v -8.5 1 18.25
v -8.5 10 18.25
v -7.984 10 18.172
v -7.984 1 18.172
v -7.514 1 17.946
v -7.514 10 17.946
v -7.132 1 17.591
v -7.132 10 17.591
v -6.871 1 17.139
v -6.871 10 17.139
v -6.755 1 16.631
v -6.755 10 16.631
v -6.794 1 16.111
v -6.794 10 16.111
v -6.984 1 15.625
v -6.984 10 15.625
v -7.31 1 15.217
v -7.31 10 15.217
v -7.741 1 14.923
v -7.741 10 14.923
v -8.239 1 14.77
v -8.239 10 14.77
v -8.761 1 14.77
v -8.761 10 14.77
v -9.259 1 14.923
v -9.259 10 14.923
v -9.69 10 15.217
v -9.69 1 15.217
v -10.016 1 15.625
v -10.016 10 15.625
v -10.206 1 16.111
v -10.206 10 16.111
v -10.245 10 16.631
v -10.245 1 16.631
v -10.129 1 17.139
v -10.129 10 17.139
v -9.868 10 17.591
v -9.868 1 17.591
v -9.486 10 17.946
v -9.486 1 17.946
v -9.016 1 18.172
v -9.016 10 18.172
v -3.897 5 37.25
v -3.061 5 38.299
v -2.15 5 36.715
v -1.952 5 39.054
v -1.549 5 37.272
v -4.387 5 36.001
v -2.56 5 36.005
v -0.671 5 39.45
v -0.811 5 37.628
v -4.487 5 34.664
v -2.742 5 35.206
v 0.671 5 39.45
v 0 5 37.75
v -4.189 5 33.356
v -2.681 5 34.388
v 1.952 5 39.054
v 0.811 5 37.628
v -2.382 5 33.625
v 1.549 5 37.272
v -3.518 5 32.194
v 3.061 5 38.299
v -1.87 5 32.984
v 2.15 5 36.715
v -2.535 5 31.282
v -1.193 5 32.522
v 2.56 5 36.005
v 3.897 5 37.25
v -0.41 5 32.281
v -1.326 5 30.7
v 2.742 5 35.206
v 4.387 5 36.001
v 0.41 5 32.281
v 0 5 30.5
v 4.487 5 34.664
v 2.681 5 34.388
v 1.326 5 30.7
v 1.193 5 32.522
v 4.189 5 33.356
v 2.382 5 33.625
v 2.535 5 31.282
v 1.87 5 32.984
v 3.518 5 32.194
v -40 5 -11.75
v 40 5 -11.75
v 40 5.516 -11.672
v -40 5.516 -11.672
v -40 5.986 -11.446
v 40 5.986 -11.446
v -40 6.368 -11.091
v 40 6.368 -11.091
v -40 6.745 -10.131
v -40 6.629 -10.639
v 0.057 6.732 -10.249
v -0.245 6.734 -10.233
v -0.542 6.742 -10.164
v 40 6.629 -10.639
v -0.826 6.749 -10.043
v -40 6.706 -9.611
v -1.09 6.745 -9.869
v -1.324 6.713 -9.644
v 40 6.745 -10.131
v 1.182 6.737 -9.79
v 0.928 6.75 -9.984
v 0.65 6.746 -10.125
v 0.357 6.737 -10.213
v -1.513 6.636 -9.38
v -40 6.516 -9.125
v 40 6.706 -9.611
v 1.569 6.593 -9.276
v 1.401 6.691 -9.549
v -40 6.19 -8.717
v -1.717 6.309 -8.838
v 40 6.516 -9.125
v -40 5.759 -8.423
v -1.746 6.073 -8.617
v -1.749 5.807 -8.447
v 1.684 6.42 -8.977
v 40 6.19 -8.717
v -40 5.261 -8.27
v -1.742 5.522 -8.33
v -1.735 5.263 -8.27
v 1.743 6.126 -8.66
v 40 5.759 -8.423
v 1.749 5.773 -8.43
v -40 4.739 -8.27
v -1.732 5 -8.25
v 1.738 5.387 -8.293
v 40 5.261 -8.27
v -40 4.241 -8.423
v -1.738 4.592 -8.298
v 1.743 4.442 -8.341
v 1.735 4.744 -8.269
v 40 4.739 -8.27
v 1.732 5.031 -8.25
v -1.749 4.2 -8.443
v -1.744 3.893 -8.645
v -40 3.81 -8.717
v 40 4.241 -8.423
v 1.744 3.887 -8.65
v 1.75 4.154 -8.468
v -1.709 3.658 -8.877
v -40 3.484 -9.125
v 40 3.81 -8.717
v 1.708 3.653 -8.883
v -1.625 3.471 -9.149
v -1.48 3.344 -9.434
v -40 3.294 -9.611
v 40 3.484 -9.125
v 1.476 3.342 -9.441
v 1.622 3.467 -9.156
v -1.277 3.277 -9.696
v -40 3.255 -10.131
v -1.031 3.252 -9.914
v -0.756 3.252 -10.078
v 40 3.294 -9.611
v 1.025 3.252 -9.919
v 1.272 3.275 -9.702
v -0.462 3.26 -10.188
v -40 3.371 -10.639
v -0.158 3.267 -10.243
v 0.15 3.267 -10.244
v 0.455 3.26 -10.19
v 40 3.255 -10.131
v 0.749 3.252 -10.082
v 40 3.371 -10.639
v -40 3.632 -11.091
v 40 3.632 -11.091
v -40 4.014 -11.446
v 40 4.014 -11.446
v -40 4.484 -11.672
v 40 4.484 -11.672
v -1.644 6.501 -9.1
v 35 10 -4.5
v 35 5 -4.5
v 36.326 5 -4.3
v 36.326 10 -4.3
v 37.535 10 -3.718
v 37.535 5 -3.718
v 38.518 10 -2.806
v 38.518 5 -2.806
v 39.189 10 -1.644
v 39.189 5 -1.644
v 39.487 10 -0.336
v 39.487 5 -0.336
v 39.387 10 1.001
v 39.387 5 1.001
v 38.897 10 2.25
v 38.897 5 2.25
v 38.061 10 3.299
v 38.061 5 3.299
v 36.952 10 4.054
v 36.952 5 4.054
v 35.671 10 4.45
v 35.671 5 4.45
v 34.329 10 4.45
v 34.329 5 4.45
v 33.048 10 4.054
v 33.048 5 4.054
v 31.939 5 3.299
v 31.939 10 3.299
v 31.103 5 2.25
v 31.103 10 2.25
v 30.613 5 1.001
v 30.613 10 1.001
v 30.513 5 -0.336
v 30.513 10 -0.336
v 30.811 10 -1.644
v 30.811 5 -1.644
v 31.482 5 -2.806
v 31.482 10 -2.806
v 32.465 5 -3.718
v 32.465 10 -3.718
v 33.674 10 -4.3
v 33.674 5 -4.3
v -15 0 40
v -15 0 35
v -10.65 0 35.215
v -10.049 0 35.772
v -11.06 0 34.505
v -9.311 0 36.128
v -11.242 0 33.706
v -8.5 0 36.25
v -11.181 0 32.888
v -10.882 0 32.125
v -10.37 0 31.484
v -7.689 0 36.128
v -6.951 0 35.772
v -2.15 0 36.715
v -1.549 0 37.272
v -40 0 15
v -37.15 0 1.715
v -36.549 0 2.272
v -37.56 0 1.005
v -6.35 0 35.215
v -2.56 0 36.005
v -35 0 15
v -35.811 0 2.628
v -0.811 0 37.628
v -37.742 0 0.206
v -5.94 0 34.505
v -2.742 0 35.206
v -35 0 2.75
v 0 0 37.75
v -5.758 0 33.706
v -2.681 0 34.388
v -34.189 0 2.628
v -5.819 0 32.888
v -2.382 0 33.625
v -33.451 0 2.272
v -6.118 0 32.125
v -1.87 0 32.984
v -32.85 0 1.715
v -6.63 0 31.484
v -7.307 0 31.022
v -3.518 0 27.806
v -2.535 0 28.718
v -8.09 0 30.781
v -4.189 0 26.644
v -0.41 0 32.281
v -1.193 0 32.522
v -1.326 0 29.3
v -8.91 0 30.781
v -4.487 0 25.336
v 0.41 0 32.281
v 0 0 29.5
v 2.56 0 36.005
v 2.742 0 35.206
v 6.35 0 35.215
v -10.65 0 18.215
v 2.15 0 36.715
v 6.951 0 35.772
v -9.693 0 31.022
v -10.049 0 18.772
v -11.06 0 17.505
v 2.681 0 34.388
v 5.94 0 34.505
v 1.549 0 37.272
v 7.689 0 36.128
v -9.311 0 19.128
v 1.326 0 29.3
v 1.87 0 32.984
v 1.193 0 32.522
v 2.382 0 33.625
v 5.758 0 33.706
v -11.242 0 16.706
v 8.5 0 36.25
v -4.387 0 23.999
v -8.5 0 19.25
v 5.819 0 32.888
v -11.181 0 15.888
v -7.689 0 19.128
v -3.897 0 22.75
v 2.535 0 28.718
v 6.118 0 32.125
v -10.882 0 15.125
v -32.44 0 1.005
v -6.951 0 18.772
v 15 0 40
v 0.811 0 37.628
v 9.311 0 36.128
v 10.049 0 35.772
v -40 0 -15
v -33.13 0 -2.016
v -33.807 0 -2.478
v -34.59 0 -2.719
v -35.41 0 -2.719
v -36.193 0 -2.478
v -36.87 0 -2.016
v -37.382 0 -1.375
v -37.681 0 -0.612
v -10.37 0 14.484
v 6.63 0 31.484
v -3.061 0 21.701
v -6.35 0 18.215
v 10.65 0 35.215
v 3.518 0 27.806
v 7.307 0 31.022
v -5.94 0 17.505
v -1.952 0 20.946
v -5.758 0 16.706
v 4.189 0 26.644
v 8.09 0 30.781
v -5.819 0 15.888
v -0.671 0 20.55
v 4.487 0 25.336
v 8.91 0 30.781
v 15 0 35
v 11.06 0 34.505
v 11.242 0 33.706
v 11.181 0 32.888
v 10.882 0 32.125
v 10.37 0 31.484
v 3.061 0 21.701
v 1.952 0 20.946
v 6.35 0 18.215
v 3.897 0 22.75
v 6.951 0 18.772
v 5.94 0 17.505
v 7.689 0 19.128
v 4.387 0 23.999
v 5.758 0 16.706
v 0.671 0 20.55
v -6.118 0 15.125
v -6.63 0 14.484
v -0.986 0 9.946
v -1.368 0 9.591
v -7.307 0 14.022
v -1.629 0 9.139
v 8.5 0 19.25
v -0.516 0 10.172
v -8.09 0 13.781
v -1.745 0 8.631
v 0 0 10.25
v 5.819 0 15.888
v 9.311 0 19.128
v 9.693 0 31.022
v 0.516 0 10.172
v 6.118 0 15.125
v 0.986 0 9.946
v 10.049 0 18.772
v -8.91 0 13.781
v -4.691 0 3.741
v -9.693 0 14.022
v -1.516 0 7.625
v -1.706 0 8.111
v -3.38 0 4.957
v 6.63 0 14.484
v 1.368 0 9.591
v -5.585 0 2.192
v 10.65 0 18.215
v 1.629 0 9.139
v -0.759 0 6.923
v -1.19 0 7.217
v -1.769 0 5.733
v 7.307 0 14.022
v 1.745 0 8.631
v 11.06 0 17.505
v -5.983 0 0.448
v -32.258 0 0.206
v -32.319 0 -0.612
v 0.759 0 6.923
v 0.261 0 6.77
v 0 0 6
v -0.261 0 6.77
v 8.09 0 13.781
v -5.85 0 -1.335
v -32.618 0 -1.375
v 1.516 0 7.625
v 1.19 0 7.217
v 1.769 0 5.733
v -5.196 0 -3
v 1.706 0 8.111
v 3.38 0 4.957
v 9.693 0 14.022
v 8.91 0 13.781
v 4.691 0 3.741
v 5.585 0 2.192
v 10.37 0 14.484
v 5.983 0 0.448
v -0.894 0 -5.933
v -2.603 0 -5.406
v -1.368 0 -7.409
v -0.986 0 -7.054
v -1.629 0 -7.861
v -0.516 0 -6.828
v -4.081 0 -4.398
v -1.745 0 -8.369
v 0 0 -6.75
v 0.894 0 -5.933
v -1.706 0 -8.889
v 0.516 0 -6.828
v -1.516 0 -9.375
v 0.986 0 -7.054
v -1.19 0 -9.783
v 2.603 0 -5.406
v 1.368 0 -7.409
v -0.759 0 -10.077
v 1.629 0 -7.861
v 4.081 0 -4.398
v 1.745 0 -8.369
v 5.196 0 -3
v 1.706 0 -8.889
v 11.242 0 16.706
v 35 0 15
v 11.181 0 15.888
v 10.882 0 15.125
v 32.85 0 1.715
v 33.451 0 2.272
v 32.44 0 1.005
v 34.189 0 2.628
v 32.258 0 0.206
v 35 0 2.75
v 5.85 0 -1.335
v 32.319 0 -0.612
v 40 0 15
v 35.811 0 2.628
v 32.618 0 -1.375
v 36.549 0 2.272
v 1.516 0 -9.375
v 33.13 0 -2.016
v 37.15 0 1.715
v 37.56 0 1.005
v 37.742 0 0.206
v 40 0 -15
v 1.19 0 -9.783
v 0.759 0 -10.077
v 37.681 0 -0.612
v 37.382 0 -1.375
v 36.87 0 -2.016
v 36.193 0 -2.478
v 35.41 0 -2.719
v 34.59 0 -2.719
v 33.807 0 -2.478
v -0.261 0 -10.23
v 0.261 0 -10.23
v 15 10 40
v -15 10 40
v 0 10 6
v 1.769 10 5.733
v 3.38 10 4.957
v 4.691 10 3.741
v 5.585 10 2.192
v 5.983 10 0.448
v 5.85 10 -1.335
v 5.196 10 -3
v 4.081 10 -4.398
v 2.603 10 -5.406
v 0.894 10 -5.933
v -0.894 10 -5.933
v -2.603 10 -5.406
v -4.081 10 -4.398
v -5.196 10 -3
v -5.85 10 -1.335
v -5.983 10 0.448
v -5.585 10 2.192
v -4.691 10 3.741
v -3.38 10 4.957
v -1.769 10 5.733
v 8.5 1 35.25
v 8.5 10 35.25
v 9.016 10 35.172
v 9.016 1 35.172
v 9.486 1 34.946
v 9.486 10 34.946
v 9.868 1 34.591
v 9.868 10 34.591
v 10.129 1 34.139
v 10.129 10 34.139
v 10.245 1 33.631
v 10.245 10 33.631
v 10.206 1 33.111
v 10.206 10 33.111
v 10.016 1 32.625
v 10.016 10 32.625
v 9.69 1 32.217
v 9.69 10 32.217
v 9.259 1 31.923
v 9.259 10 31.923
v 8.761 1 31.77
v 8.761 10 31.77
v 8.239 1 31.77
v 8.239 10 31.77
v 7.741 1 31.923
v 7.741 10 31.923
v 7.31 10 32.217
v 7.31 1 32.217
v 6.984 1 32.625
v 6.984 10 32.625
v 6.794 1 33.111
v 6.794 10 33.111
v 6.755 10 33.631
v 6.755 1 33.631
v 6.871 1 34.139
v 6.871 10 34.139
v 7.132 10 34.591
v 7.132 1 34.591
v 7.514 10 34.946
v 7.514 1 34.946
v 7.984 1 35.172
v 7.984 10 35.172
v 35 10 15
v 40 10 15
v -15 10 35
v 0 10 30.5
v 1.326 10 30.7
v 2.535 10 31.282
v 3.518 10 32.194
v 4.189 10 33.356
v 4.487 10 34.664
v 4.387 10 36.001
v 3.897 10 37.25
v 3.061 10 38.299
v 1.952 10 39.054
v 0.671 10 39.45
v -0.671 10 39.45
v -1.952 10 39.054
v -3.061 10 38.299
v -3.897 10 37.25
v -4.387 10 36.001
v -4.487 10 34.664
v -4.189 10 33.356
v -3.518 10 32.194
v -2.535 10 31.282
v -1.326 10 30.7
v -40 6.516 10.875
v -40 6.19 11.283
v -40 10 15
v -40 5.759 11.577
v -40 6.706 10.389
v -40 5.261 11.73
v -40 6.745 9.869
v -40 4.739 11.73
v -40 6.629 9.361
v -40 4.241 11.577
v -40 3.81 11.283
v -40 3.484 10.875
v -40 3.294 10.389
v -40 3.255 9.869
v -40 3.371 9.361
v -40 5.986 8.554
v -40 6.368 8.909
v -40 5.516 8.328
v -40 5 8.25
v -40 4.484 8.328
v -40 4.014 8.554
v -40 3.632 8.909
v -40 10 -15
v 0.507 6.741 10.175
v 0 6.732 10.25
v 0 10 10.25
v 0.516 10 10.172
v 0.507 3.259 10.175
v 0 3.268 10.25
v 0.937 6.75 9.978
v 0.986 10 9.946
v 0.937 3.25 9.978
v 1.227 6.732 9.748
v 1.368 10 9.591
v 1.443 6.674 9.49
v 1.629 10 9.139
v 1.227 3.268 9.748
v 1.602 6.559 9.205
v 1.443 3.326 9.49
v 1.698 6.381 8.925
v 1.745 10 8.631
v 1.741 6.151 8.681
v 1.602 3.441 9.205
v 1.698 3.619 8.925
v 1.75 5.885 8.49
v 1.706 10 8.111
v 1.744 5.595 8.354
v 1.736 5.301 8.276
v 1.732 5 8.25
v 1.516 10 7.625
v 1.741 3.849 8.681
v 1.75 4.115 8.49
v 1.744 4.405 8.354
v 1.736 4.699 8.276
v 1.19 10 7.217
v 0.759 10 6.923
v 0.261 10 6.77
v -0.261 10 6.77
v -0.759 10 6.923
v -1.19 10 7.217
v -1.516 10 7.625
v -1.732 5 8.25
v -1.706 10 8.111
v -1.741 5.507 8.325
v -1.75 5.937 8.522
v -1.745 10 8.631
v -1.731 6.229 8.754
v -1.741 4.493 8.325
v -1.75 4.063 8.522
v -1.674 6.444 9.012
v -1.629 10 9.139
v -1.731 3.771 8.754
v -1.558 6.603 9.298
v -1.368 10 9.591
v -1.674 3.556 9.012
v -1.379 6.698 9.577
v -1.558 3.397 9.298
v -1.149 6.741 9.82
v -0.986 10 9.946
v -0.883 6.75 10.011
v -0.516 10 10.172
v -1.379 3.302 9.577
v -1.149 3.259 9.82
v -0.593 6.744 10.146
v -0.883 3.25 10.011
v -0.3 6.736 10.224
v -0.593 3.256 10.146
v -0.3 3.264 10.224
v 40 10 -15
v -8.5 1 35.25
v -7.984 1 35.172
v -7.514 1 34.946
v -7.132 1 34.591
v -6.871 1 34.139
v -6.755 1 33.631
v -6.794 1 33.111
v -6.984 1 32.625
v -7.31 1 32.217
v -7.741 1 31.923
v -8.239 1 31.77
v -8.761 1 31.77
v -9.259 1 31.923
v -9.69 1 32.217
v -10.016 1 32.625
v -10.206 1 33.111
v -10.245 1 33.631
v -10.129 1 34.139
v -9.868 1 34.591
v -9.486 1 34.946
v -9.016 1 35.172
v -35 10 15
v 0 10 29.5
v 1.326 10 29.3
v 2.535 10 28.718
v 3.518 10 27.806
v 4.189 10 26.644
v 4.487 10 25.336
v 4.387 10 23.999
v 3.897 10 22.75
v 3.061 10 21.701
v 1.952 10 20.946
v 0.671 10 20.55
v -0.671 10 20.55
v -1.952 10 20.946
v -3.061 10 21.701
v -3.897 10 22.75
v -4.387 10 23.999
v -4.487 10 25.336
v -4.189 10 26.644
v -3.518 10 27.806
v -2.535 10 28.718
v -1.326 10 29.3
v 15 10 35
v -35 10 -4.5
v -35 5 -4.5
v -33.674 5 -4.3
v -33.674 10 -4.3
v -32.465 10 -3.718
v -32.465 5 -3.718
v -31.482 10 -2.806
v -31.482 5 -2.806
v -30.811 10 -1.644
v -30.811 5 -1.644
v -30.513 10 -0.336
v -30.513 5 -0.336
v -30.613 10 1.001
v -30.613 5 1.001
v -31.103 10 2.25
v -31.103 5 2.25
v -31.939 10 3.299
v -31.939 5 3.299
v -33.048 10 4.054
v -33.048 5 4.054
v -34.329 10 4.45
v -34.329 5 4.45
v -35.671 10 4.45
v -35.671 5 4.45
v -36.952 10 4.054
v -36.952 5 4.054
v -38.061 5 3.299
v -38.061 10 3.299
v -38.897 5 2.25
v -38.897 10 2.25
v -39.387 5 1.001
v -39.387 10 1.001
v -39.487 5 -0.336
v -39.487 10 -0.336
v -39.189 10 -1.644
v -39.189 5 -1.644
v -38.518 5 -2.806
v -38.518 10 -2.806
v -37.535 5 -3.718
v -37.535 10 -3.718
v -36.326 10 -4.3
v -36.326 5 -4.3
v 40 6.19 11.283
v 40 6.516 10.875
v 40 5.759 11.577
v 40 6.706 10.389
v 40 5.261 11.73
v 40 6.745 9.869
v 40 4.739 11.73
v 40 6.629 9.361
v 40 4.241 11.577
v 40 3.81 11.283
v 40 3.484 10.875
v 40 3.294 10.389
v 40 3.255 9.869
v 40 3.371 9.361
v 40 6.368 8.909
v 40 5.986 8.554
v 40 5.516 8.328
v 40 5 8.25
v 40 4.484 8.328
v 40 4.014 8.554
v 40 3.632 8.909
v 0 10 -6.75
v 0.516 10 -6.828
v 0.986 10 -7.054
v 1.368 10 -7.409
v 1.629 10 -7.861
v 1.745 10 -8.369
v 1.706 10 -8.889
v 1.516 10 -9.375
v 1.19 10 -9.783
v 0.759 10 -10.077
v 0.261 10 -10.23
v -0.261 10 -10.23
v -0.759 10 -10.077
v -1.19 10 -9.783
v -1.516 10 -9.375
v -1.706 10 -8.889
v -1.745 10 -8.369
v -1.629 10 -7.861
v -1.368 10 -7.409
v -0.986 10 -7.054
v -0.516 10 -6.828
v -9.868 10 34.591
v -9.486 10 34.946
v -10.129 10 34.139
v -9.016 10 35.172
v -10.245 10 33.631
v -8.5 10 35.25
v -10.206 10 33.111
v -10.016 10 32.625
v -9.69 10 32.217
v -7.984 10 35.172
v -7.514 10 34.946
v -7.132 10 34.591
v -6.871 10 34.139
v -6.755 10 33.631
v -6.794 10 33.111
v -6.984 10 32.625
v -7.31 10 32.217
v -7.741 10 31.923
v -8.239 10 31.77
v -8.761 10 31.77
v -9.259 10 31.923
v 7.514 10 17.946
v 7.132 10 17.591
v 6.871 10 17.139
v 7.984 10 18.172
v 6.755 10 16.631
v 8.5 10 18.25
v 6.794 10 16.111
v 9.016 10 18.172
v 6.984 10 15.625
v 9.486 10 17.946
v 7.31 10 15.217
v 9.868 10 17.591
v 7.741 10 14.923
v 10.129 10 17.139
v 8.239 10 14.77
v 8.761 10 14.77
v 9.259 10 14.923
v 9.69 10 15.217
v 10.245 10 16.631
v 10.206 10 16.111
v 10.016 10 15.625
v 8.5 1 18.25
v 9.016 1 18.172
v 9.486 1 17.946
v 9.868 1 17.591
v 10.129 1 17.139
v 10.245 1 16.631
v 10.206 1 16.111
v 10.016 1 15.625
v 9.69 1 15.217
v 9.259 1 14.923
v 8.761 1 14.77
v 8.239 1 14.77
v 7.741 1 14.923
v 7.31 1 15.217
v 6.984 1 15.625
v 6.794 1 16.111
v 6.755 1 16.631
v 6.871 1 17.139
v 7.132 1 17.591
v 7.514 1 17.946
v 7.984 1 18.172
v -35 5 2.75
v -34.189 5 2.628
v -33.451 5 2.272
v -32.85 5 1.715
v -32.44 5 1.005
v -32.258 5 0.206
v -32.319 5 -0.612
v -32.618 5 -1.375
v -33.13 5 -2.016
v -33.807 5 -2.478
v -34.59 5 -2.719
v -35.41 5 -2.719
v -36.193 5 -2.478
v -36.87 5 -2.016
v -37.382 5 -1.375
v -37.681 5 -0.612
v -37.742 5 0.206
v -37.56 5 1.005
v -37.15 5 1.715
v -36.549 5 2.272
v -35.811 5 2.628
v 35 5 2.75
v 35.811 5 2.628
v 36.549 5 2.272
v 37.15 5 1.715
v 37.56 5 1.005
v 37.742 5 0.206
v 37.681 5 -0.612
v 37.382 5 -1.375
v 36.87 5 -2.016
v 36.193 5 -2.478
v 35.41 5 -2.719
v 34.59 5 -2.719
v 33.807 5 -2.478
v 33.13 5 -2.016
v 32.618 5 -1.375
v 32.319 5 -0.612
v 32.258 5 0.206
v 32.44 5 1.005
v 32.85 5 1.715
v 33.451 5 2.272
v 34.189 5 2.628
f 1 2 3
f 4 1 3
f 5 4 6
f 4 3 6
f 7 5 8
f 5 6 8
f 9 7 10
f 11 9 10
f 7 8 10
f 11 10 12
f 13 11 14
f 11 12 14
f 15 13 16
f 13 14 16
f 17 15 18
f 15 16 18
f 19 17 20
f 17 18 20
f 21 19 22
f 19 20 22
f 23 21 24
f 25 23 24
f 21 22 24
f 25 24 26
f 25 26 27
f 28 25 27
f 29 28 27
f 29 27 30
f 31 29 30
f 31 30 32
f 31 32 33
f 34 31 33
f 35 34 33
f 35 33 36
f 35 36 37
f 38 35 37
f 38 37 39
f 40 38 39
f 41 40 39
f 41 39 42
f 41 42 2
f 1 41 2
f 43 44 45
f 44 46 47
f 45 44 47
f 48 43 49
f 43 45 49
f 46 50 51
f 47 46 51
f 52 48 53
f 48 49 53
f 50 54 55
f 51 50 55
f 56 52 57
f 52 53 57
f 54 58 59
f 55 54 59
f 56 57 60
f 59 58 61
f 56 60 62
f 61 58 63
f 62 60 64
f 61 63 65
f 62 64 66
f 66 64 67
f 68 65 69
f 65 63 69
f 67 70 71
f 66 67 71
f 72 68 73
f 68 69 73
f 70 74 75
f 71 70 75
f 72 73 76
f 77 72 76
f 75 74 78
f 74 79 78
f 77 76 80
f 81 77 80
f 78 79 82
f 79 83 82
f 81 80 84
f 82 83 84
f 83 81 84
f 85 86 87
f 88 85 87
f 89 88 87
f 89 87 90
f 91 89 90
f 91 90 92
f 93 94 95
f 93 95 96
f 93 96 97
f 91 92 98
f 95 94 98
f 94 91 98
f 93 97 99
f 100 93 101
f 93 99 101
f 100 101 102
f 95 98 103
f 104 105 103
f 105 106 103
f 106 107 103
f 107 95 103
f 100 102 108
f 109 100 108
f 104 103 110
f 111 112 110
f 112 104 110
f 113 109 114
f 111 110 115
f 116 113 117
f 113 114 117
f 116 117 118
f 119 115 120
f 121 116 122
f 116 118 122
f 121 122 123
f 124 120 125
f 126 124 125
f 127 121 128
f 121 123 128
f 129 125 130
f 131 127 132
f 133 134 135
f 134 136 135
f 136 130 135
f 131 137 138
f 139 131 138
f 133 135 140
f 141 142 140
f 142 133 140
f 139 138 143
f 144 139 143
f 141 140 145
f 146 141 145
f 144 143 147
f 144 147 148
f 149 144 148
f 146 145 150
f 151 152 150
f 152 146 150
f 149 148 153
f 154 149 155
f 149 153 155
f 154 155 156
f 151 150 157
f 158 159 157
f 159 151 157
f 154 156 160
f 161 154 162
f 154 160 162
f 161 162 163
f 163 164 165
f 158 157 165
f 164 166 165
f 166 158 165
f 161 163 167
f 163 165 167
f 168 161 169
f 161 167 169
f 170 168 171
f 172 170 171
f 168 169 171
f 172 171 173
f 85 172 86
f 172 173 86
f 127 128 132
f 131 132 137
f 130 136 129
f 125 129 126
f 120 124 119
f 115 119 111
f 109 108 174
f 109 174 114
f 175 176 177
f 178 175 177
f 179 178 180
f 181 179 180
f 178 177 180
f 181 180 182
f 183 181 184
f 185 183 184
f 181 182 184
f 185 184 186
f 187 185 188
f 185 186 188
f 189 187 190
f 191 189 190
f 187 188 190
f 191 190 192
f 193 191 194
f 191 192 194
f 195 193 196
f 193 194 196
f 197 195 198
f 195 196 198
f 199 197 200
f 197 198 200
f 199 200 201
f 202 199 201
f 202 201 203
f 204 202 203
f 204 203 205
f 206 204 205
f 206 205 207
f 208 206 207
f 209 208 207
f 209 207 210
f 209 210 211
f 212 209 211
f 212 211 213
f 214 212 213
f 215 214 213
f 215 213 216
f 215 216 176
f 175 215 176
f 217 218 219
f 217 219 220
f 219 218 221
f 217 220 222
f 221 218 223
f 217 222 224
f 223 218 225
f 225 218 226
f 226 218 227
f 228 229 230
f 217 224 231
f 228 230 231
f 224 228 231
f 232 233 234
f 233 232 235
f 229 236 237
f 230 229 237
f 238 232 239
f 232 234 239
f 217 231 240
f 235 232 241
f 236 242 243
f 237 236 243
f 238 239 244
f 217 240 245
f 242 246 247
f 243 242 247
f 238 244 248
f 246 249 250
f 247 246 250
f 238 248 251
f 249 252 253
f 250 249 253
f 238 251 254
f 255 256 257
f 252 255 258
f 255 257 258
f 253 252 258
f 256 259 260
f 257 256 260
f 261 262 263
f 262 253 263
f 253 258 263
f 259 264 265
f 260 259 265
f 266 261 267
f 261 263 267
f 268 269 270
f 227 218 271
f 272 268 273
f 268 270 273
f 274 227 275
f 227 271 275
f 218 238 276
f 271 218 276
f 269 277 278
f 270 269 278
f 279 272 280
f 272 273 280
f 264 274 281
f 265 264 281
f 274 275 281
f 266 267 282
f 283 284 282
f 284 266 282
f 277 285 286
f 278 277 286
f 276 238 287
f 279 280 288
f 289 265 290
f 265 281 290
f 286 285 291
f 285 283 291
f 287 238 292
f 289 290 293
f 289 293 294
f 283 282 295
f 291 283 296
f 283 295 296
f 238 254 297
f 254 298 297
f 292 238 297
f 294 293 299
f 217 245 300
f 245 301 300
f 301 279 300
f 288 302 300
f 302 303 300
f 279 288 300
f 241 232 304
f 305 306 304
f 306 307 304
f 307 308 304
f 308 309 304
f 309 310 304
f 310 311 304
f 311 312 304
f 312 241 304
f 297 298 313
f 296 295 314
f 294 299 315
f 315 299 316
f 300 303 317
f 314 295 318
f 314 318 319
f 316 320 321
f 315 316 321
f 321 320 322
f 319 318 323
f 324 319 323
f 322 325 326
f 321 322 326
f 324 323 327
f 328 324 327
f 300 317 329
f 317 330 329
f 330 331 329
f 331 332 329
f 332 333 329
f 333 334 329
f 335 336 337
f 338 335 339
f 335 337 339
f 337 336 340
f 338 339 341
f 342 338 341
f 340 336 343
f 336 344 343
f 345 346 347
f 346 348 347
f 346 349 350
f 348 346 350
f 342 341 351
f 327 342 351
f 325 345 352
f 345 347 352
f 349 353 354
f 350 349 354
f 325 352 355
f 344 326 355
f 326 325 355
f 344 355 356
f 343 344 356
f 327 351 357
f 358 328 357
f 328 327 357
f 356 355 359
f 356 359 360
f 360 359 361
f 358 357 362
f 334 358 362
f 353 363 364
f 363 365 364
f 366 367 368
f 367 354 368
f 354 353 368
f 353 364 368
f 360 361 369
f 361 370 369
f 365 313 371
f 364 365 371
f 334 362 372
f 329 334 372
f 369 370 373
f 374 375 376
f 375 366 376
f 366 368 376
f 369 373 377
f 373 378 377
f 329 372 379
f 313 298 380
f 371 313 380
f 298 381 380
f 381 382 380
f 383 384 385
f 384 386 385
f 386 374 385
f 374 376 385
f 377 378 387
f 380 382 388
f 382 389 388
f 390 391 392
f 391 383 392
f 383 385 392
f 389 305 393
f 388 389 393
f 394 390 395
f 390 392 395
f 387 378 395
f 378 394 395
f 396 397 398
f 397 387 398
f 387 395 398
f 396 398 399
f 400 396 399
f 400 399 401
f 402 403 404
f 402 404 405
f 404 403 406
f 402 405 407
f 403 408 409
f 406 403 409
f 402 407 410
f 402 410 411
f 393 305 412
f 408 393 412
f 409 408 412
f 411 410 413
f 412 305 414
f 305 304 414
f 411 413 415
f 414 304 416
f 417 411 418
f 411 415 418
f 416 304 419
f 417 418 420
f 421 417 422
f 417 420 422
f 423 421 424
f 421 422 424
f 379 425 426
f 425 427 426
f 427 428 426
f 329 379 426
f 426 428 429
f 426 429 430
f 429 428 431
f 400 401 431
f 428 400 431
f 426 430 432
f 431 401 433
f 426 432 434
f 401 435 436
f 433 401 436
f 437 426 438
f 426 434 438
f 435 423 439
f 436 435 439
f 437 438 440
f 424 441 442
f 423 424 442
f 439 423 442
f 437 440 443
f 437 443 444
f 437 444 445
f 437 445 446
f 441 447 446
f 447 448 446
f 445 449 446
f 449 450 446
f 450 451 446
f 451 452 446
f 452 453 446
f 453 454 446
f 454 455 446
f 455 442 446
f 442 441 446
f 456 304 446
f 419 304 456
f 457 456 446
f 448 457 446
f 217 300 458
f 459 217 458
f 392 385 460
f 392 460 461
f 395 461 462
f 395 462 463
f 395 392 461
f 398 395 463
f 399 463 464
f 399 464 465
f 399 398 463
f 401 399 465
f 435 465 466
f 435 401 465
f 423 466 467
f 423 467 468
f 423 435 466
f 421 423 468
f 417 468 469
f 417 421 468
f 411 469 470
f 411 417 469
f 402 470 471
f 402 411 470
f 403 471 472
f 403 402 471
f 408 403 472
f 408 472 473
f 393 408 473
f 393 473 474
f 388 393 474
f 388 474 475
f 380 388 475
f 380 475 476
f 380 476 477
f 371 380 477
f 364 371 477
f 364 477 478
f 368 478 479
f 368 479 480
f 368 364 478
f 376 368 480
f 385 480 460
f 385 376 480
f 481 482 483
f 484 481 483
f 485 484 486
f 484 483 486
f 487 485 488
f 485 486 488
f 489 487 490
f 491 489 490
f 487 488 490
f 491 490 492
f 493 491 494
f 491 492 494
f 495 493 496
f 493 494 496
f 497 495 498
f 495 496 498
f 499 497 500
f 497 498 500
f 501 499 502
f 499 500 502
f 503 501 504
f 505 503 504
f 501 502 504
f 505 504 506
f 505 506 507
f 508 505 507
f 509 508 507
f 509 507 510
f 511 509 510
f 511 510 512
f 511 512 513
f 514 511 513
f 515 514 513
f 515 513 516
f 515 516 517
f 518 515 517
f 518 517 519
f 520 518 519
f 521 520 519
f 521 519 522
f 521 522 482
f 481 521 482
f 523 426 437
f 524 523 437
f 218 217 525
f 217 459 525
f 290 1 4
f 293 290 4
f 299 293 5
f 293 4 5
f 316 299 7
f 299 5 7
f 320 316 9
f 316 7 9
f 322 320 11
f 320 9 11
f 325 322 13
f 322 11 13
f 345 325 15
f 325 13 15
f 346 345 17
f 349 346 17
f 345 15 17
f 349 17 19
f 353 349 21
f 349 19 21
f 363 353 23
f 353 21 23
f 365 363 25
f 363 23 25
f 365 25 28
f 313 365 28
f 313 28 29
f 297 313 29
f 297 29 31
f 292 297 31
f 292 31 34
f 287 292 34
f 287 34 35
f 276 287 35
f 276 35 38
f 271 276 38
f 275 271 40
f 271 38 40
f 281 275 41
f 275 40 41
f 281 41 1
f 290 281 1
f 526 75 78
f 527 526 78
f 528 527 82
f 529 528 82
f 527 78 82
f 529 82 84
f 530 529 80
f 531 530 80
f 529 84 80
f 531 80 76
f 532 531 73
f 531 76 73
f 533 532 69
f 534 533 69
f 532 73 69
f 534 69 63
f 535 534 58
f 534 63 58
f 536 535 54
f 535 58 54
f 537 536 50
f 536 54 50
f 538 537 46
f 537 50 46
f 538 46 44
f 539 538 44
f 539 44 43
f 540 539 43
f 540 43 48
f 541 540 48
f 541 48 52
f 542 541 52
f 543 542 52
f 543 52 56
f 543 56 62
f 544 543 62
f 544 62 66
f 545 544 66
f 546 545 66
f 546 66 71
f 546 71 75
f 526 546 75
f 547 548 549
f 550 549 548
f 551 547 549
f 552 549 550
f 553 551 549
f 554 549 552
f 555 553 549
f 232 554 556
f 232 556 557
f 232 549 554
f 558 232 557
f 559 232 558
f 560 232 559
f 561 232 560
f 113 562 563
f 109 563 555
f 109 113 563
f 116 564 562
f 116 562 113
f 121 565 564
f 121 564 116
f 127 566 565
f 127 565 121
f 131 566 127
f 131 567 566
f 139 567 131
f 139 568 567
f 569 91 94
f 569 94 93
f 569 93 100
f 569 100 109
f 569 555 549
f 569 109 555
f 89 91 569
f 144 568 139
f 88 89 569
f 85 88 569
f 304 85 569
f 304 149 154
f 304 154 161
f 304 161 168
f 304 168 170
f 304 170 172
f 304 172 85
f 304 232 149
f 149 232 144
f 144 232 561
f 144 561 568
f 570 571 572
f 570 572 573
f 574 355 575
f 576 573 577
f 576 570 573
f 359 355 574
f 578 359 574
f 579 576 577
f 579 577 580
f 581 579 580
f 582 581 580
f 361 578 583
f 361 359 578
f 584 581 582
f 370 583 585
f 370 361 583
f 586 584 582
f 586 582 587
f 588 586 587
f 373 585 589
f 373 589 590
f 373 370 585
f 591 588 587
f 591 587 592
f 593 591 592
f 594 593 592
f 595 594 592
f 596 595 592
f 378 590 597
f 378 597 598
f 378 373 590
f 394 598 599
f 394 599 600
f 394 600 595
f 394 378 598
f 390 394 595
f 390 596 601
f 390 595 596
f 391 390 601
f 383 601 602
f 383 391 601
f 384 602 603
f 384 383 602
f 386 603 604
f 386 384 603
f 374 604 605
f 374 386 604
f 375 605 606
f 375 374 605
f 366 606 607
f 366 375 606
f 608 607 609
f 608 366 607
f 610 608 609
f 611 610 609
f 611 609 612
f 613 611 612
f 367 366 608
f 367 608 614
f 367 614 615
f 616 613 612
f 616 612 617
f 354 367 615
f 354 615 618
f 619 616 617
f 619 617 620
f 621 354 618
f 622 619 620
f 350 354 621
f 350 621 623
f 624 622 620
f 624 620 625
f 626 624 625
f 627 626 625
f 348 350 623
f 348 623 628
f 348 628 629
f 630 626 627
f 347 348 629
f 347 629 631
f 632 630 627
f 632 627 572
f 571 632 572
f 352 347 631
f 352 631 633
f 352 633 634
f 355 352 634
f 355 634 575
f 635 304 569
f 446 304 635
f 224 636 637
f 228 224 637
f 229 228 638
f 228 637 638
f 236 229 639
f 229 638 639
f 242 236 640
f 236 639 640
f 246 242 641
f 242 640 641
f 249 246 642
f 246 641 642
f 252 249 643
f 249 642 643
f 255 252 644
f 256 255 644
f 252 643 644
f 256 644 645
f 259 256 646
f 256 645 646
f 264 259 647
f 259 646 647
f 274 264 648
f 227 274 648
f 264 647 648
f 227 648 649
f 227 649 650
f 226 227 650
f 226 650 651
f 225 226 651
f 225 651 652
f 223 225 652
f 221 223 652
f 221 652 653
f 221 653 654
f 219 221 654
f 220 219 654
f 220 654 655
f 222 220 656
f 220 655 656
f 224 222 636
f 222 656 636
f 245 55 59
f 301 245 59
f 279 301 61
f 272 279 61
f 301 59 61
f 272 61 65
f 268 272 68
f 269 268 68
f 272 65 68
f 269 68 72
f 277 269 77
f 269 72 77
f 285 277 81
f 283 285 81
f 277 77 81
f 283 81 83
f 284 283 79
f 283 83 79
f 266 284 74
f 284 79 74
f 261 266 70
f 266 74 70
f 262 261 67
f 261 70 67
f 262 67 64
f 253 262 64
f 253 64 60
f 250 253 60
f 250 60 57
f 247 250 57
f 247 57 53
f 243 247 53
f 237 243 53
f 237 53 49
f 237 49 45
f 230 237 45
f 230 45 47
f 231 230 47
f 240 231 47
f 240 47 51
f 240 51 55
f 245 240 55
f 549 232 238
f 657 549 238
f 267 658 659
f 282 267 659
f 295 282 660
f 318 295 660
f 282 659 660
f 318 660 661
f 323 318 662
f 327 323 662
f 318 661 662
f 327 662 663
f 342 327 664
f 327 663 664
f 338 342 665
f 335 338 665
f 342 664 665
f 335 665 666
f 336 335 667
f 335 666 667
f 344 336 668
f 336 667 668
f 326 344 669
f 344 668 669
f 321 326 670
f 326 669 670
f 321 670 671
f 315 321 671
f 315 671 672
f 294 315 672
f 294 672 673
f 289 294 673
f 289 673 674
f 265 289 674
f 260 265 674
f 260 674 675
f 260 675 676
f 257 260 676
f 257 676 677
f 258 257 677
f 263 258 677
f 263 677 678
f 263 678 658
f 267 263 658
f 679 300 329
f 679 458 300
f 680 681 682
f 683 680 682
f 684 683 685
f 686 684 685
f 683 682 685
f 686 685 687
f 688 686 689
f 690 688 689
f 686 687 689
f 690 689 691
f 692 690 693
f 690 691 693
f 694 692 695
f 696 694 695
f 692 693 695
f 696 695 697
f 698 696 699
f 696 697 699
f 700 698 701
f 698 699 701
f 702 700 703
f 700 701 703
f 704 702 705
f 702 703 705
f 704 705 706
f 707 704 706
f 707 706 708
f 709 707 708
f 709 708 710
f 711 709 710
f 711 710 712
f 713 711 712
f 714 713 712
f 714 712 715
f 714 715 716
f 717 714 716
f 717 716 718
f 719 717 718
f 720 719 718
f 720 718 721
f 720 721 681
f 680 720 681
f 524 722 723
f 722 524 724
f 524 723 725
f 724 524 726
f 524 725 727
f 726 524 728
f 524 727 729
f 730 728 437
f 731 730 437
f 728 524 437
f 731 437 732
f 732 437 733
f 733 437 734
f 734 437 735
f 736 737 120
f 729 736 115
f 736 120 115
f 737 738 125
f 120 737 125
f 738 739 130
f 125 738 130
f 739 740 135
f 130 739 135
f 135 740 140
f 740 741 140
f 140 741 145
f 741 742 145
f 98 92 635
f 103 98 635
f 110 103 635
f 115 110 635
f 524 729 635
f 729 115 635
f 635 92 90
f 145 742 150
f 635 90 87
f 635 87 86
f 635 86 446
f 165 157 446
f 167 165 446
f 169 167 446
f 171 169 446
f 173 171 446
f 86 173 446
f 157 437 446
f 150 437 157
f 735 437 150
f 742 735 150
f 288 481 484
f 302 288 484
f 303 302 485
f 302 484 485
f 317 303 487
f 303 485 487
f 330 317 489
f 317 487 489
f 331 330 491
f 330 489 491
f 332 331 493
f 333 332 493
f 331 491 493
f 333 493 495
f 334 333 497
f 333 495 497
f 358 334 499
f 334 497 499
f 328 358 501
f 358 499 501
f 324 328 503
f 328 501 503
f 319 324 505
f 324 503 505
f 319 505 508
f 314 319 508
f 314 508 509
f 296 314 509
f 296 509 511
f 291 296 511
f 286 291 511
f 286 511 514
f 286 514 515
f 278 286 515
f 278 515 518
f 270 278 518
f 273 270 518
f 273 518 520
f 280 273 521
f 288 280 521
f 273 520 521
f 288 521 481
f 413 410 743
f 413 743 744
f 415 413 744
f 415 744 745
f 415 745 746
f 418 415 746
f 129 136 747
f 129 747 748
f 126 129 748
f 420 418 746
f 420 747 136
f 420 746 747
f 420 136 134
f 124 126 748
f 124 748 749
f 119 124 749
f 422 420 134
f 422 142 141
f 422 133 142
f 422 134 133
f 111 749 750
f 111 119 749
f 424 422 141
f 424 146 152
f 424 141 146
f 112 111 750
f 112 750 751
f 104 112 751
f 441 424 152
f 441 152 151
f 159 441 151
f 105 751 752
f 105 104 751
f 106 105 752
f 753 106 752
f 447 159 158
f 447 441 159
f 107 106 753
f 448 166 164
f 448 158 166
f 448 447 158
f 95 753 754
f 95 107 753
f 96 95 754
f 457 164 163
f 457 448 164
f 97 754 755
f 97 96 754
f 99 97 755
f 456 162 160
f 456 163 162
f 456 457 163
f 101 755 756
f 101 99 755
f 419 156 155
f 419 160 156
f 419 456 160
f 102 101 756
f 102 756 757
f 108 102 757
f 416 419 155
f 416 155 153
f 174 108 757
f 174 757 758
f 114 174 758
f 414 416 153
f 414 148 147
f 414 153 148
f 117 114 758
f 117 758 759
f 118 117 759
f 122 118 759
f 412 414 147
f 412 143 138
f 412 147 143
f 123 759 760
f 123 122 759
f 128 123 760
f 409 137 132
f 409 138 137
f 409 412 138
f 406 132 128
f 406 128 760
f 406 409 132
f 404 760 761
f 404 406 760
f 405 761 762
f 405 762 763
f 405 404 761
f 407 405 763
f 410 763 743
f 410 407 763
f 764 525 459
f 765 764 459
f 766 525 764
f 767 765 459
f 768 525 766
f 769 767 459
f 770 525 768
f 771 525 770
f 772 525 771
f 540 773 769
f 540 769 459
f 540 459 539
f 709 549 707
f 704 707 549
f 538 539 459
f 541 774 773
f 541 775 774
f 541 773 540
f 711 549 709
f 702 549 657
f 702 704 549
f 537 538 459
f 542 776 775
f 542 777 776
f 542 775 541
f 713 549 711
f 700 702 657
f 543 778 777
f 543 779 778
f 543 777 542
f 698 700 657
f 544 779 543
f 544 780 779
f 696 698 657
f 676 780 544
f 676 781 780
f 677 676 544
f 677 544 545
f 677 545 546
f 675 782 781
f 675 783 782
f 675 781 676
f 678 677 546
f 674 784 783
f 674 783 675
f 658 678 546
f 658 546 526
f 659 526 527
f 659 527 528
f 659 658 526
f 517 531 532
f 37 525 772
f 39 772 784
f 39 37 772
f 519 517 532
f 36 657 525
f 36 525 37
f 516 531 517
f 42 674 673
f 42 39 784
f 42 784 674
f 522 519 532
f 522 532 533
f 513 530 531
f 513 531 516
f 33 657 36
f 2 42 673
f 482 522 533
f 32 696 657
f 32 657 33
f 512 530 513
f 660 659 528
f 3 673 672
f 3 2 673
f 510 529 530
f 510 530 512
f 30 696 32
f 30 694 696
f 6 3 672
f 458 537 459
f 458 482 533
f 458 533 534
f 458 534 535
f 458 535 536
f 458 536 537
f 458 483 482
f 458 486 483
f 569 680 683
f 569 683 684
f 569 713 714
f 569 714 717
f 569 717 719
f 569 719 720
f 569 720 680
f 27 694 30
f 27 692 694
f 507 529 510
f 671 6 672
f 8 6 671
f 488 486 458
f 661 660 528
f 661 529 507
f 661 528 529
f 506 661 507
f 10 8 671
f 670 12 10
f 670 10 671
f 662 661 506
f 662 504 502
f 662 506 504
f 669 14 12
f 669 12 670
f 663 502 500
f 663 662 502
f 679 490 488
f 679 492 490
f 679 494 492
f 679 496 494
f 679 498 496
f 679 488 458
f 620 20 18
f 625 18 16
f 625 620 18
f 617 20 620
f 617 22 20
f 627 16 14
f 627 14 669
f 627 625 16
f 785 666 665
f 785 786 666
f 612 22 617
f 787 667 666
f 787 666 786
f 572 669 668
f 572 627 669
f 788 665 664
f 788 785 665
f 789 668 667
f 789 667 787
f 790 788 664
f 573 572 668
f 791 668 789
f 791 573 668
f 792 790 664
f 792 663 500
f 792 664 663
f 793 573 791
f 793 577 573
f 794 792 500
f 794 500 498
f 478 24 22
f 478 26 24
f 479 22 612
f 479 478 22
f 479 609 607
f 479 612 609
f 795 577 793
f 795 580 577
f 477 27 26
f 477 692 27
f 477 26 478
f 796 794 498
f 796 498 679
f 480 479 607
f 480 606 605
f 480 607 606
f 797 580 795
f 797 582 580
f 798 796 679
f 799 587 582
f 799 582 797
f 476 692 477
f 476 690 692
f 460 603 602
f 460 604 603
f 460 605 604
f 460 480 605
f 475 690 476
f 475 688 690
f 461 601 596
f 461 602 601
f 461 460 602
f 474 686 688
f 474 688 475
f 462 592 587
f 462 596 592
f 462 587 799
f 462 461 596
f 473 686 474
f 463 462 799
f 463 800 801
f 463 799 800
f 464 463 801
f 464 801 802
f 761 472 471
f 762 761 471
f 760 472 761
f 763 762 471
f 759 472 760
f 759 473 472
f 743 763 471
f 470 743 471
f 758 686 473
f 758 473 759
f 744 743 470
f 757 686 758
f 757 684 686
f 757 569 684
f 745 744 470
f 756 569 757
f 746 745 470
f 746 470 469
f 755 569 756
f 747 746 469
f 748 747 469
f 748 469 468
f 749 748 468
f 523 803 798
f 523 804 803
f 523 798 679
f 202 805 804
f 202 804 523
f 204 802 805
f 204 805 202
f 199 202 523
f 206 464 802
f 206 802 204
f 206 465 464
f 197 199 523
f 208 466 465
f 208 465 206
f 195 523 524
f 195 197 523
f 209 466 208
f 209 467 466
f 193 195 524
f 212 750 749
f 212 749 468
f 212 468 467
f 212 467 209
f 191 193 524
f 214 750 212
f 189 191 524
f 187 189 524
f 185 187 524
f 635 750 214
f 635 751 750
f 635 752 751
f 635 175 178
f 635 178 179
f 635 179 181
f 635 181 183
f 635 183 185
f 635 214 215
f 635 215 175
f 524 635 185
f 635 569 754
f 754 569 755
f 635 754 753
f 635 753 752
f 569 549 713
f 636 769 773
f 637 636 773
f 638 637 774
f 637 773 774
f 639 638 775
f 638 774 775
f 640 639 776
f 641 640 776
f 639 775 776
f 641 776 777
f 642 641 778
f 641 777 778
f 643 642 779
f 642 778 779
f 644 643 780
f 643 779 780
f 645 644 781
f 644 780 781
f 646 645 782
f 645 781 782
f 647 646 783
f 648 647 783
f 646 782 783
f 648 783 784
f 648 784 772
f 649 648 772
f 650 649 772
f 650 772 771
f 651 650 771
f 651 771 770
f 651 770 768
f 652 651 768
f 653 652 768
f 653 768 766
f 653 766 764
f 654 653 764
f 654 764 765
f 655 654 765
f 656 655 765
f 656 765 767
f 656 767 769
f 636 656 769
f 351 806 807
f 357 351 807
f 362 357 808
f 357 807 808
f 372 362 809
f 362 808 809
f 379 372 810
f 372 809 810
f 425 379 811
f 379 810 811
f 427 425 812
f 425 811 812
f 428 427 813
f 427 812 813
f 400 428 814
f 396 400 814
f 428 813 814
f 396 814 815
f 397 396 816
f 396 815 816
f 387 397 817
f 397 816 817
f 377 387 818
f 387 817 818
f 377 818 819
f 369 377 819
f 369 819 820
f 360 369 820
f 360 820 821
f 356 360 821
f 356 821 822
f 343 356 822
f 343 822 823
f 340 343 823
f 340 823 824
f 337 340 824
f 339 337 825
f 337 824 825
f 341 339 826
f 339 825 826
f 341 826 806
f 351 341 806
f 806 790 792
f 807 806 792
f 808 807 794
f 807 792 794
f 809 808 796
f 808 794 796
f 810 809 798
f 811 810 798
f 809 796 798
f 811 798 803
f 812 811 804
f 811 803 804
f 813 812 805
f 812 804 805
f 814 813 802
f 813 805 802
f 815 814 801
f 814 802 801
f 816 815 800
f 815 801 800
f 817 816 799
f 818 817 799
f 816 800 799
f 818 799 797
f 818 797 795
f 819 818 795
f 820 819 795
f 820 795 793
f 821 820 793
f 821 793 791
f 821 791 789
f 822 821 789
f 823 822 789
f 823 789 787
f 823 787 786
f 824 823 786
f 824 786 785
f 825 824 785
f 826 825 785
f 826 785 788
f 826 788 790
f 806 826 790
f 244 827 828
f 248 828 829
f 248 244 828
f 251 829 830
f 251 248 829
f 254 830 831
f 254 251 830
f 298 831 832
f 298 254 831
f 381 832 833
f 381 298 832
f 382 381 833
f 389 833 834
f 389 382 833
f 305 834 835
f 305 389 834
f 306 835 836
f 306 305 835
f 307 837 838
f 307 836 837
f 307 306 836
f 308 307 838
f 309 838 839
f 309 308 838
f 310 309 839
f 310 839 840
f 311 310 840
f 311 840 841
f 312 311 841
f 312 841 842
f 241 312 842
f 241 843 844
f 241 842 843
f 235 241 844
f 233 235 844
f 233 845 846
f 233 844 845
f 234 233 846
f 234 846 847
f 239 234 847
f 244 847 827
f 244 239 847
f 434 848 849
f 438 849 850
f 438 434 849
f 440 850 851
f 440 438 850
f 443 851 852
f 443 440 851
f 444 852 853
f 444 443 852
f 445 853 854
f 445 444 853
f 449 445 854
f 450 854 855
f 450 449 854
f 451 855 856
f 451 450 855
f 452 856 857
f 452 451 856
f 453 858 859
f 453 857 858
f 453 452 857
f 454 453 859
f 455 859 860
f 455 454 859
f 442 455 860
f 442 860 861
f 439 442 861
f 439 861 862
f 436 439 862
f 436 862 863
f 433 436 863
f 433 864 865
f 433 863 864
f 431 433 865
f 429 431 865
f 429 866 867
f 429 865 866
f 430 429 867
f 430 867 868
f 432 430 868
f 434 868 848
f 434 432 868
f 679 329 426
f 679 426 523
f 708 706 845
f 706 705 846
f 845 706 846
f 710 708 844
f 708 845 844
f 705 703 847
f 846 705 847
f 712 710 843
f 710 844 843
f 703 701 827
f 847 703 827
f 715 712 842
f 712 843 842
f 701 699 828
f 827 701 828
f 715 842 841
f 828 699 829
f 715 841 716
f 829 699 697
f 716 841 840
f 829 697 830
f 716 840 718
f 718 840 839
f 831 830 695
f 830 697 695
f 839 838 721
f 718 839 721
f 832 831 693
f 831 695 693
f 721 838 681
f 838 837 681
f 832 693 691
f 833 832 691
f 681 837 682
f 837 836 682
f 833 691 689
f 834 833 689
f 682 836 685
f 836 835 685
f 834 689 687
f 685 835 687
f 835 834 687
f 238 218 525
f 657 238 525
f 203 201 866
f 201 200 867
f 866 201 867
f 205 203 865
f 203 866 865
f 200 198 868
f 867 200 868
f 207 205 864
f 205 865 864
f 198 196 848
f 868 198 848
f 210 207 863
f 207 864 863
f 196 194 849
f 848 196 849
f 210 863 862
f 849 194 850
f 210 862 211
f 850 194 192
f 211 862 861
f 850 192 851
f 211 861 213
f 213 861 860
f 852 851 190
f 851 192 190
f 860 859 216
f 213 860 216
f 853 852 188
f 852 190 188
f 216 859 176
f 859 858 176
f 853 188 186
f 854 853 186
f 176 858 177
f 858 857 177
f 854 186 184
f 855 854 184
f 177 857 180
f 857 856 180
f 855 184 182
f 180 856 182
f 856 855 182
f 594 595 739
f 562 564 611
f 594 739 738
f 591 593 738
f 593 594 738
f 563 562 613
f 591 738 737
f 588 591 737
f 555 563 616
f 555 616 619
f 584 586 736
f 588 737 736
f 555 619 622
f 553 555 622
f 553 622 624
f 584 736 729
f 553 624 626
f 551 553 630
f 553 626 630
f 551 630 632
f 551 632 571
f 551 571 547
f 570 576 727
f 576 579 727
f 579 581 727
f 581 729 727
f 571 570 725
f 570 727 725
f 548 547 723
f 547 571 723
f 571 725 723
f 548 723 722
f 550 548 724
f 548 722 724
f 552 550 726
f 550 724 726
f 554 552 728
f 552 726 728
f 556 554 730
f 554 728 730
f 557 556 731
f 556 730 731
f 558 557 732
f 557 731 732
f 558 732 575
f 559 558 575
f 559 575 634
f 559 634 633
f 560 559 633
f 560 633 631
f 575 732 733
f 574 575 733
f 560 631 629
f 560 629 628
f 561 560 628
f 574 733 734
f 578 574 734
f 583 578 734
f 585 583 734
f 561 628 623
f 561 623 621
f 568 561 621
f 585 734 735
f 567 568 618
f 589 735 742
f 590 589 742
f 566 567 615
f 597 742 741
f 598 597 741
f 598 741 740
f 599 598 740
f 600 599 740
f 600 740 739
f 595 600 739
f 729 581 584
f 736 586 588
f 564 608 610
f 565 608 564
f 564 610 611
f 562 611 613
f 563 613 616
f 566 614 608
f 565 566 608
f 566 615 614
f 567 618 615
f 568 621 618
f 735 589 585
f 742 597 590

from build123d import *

# Parameters (mm, degrees)
SKETCH1_W           = 80
SKETCH1_H           = 30
SKETCH1_R           = 1.75
SKETCH1_R_2         = 6
SKETCH1_R_3         = 2.75
BOSS_EXTRUDE1_DEPTH = 10
SKETCH4_W           = 25
SKETCH4_H           = 10
BOSS_EXTRUDE3_DEPTH = 15
SKETCH5_R           = 2.75
CUT_EXTRUDE1_DEPTH  = 30
CHAMFER2_SIZE       = 20
SKETCH6_R           = 1.75
SKETCH6_R_2         = 4.5
CUT_EXTRUDE2_DEPTH  = 30
SKETCH8_R           = 1.75
CUT_EXTRUDE3_DEPTH  = 91
CUT_EXTRUDE13_START = -5
SKETCH12_R          = 4.5
CUT_EXTRUDE13_DEPTH = 53.445626552
CHAMFER3_SIZE       = 1


with BuildPart() as part:
    # Sketch1 → Boss-Extrude1 (new body)
    with BuildSketch(Plane(origin=(0, 0, 0), x_dir=(1, 0, 0), z_dir=(0, 1, 0))):
        Rectangle(SKETCH1_W, SKETCH1_H)
        with Locations(Location((0, 8.5, 0), (0, 0, 270))):
            Circle(SKETCH1_R, mode=Mode.SUBTRACT)
        with Locations(Location((0, -8.5, 0), (0, 0, 270))):
            Circle(SKETCH1_R, mode=Mode.SUBTRACT)
        with Locations(Location((0, 0, 0), (0, 0, 270))):
            Circle(SKETCH1_R_2, mode=Mode.SUBTRACT)
        with Locations(Location((-35, 0, 0), (0, 0, 270))):
            Circle(SKETCH1_R_3, mode=Mode.SUBTRACT)
        with Locations(Location((35, 0, 0), (0, 0, 270))):
            Circle(SKETCH1_R_3, mode=Mode.SUBTRACT)
    extrude(amount=BOSS_EXTRUDE1_DEPTH)

    # Sketch4 → Boss-Extrude3 (add, symmetric)
    with BuildSketch(Plane(origin=(0, 0, 0), x_dir=(0, 0, -1), z_dir=(1, 0, 0))):
        with Locations((-27.5, 5)):
            Rectangle(SKETCH4_W, SKETCH4_H)
    extrude(amount=BOSS_EXTRUDE3_DEPTH, both=True)

    # Sketch5 → Cut-Extrude1 (cut)
    with BuildSketch(Plane(origin=(0, 10, 0), x_dir=(1, 0, 0), z_dir=(0, 1, 0))):
        with Locations(Location((0, -35, 0), (0, 0, 270))):
            Circle(SKETCH5_R)
    extrude(amount=-CUT_EXTRUDE1_DEPTH, mode=Mode.SUBTRACT)

    # Chamfer2
    chamfer2_edges = [part.edges().sort_by_distance(p)[0] for p in [
        (-15, 5, 15),
        (15, 5, 15),
    ]]
    chamfer(chamfer2_edges, length=CHAMFER2_SIZE)

    # Sketch6 → Cut-Extrude2 (cut)
    with BuildSketch(Plane(origin=(0, 10, 0), x_dir=(1, 0, 0), z_dir=(0, 1, 0))):
        with Locations(Location((-8.5, -16.5, 0), (0, 0, 270))):
            Circle(SKETCH6_R)
        with Locations(Location((8.5, -16.5, 0), (0, 0, 270))):
            Circle(SKETCH6_R)
        with Locations(Location((8.5, -33.5, 0), (0, 0, 270))):
            Circle(SKETCH6_R)
        with Locations(Location((-8.5, -33.5, 0), (0, 0, 270))):
            Circle(SKETCH6_R)
        with Locations(Location((0, -25, 0), (0, 0, 270))):
            Circle(SKETCH6_R_2)
    extrude(amount=-CUT_EXTRUDE2_DEPTH, mode=Mode.SUBTRACT)

    # Sketch8 → Cut-Extrude3 (cut, through all)
    with BuildSketch(Plane(origin=(40, 0, 0), x_dir=(0, 0, -1), z_dir=(1, 0, 0))):
        with Locations((-10, 5)):
            Circle(SKETCH8_R)
        with Locations((10, 5)):
            Circle(SKETCH8_R)
    extrude(amount=-CUT_EXTRUDE3_DEPTH, mode=Mode.SUBTRACT)

    # Sketch12 → Cut-Extrude13 (cut, through all)
    with BuildSketch(Plane.XZ.offset(CUT_EXTRUDE13_START)):
        with Locations(Location((0, 35, 0), (0, 0, 270))):
            Circle(SKETCH12_R)
        with Locations(Location((35, 0, 0), (0, 0, 270))):
            Circle(SKETCH12_R)
        with Locations(Location((-35, 0, 0), (0, 0, 270))):
            Circle(SKETCH12_R)
    extrude(amount=-CUT_EXTRUDE13_DEPTH, mode=Mode.SUBTRACT)

    # Chamfer3
    chamfer3_edges = [part.edges().sort_by_distance(p)[0] for p in [
        (-8.5, 0, 14.75),
        (8.5, 0, 31.75),
        (-8.5, 0, 31.75),
        (8.5, 0, 14.75),
    ]]
    chamfer(chamfer3_edges, length=CHAMFER3_SIZE)


solid = part.part
